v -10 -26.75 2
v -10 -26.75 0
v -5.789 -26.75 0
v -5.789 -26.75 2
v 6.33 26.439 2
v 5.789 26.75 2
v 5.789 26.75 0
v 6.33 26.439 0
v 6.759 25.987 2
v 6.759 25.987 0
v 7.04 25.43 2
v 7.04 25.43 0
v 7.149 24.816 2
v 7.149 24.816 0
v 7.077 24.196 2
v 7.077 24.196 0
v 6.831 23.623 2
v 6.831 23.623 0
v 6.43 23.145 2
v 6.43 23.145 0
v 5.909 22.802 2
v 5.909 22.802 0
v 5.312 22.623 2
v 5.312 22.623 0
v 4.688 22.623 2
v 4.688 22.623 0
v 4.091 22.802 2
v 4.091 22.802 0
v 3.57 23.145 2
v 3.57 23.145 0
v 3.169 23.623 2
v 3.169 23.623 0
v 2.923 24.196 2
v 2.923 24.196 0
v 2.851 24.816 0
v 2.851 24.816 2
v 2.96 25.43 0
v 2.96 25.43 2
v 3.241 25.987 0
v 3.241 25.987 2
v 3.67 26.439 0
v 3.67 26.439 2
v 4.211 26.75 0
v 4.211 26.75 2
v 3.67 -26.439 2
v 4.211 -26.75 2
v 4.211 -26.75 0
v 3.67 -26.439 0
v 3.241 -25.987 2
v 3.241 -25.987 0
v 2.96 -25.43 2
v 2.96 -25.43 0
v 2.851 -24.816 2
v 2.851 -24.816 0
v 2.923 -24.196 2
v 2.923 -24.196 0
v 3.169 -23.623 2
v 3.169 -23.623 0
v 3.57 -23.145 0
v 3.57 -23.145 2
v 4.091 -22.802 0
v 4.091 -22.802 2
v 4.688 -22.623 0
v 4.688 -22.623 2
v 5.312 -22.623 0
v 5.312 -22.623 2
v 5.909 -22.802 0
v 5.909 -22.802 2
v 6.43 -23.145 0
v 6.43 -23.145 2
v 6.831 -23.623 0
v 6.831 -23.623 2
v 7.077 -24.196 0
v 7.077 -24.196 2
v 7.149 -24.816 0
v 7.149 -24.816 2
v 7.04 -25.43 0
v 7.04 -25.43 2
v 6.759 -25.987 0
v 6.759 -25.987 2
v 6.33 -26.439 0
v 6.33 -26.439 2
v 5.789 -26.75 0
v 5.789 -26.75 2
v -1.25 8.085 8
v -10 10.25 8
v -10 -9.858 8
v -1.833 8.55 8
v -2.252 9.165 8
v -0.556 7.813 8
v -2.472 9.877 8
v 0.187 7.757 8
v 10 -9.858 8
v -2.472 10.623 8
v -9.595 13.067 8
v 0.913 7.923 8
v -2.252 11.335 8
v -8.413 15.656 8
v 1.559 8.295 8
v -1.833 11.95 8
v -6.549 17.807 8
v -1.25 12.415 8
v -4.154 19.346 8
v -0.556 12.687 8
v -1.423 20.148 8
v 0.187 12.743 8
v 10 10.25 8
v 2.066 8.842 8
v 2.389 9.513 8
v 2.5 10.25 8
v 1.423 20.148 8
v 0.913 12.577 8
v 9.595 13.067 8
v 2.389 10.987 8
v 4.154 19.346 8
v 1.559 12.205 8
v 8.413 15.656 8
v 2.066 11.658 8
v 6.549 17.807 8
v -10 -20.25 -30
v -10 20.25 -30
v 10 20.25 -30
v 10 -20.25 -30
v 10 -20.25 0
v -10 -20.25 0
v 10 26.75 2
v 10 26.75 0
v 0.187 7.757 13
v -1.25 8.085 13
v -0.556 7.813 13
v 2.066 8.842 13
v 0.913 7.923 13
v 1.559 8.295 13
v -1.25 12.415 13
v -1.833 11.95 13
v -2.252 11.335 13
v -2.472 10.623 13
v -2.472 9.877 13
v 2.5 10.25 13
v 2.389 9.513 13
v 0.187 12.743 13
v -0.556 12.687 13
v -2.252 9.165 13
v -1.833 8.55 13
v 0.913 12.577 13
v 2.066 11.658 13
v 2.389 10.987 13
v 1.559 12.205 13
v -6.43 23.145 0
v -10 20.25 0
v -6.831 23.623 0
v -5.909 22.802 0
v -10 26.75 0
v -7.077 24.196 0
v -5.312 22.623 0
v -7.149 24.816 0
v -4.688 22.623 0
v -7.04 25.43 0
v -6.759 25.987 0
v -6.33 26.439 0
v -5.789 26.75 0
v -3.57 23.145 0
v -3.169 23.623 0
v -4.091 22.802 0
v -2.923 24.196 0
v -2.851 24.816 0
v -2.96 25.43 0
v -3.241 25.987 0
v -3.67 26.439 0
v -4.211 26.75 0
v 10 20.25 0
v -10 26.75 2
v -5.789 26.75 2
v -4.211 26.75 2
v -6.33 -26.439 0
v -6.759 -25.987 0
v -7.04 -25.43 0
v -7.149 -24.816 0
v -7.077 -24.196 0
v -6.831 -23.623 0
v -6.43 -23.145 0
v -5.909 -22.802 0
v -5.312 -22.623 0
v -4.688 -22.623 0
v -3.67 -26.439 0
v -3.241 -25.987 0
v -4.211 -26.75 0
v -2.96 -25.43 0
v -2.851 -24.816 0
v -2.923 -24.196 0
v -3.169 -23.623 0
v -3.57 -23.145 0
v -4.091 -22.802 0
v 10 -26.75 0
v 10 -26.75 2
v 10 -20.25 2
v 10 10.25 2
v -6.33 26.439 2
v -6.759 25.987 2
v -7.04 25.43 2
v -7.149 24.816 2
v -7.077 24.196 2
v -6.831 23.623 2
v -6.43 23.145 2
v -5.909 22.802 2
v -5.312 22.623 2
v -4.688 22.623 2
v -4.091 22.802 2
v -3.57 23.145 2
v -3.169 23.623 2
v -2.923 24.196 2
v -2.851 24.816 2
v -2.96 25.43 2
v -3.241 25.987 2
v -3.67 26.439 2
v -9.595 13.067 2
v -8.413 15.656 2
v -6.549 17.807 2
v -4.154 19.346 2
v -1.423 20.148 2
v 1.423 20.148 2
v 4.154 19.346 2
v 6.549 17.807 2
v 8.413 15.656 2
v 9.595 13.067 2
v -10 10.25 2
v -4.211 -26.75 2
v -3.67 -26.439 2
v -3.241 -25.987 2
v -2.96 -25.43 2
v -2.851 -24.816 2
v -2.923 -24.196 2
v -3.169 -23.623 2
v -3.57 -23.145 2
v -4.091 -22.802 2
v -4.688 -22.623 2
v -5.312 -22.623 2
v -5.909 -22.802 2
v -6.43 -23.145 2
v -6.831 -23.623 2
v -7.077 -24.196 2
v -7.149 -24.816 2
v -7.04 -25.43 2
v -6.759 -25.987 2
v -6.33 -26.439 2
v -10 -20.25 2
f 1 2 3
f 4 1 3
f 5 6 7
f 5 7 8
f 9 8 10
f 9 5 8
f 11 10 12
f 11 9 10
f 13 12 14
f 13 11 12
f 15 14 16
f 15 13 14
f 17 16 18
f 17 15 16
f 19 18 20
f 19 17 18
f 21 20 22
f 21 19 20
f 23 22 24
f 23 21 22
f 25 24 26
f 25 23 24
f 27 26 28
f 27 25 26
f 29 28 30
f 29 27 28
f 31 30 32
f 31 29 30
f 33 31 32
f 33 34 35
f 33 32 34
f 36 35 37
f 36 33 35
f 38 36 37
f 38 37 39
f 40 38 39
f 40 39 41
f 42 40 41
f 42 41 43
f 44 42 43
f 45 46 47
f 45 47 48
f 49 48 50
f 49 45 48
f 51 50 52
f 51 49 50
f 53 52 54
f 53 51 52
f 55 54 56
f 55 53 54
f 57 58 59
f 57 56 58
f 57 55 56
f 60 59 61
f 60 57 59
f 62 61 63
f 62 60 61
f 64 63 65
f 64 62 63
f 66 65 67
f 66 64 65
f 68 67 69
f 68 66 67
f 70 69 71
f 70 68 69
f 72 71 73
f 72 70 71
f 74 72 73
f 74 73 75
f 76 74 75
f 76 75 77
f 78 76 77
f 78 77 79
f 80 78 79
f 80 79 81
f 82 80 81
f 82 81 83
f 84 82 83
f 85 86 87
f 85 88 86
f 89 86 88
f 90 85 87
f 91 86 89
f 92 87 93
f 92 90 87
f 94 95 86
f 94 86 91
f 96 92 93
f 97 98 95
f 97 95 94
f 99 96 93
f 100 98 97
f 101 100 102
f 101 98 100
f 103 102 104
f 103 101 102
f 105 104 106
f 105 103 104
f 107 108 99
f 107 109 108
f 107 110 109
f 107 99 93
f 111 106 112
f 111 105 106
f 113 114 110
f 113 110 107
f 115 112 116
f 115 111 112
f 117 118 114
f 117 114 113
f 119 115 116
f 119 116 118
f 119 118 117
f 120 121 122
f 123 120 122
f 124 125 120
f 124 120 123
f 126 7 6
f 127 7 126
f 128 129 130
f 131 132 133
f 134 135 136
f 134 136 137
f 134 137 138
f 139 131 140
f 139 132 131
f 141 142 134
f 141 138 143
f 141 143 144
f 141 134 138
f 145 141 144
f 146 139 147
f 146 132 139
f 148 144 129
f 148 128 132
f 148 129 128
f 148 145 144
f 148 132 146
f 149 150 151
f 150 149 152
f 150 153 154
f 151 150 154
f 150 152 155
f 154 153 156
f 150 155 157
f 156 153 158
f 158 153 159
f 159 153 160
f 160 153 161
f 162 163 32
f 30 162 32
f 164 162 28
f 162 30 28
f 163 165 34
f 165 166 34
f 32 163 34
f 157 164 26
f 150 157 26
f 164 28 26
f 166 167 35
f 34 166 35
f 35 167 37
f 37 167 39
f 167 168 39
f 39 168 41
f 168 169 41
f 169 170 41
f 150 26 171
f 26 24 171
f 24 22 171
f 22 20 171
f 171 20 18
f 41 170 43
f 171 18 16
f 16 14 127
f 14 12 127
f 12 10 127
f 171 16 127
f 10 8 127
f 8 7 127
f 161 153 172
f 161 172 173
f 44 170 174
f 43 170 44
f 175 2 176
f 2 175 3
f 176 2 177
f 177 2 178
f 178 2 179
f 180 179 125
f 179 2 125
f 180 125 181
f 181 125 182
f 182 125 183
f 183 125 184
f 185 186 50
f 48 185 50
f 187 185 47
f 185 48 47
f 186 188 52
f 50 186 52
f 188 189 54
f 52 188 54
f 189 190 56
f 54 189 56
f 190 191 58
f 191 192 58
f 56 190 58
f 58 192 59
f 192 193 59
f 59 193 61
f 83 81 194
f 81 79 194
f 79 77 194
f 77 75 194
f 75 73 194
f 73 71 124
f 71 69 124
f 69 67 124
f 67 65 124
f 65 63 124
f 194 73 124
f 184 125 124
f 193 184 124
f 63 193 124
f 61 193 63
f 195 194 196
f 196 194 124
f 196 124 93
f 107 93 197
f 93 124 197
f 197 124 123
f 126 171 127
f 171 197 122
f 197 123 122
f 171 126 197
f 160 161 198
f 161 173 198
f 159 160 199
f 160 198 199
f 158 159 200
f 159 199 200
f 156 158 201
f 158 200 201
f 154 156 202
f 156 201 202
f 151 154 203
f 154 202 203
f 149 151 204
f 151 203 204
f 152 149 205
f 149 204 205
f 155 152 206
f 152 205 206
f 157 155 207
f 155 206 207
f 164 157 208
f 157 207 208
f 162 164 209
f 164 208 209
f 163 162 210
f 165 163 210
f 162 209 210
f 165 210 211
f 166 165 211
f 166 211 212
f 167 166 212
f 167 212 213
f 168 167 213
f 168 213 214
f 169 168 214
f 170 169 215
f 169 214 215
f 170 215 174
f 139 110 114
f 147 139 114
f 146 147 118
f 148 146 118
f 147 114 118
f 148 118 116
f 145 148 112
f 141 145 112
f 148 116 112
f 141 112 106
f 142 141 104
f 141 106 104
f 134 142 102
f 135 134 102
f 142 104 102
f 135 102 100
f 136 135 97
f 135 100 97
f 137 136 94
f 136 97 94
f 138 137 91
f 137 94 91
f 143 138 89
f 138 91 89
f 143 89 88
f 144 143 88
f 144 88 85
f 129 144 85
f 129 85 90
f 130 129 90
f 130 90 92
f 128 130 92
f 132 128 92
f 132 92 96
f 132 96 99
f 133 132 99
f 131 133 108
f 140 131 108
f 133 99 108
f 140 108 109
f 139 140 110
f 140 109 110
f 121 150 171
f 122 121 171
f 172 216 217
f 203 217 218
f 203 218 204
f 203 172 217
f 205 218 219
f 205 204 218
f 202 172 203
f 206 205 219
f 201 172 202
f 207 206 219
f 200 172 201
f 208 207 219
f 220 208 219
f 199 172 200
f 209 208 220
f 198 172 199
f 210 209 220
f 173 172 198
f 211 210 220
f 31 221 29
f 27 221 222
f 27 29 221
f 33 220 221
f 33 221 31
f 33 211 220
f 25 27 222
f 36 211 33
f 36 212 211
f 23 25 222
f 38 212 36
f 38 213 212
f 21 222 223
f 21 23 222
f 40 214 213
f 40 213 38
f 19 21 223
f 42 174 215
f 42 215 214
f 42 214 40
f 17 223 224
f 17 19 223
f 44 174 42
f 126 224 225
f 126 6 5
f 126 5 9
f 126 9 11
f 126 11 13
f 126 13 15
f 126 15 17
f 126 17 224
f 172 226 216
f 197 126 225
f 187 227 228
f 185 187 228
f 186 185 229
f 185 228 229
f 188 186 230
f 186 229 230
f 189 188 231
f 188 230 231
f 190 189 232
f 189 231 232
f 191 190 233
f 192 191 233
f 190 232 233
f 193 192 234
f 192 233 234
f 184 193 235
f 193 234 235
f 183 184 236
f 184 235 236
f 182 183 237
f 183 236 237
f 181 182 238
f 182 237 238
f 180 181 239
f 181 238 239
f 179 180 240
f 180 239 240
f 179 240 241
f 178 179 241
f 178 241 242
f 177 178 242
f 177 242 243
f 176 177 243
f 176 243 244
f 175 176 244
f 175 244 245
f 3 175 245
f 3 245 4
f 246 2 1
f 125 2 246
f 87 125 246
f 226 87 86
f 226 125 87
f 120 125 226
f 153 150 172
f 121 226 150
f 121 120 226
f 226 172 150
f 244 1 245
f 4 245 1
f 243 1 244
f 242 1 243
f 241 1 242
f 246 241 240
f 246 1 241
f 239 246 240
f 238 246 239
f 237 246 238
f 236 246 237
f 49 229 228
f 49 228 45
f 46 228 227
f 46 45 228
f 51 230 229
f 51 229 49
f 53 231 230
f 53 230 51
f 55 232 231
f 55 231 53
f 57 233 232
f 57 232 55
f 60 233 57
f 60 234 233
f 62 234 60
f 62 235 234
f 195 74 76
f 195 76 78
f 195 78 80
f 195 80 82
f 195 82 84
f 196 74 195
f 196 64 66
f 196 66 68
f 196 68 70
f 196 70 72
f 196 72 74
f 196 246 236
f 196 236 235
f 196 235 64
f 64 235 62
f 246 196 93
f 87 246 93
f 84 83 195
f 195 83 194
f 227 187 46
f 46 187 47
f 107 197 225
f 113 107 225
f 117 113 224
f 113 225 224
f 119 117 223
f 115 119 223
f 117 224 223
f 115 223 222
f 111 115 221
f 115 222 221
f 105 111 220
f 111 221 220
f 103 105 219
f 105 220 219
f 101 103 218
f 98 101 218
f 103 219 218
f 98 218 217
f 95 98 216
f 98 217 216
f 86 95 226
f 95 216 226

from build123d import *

# Parameters (mm, degrees)
SKETCH_W        = 20
SKETCH_H        = 40.5
PAD_DEPTH       = 30
SKETCH001_W     = 20
SKETCH001_H     = 53.5
PAD001_DEPTH    = 2
SKETCH002_R     = 2.15
POCKET_DEPTH    = 162.939917
PAD002_DEPTH    = 6
SKETCH004_R     = 2.5
PAD003_DEPTH    = 5
POCKET001_DEPTH = 20.001


with BuildPart() as part:
    # Sketch → Pad (new body)
    with BuildSketch(Plane.XY):
        Rectangle(SKETCH_W, SKETCH_H)
    extrude(amount=-PAD_DEPTH)

    # Sketch001 (on Face5 of Pad) → Pad001 (join)
    with BuildSketch(Plane.XY):
        Rectangle(SKETCH001_W, SKETCH001_H)
    extrude(amount=PAD001_DEPTH)

    # Sketch002 (on Face5 of Pad001) → Pocket (cut, through all)
    with BuildSketch(Plane.XY.offset(2)):
        with Locations((-5, -24.75)):
            Circle(SKETCH002_R)
        with Locations((-5, 24.75)):
            Circle(SKETCH002_R)
    pocket = extrude(amount=-POCKET_DEPTH, mode=Mode.SUBTRACT)

    # Mirrored: Pocket across Sketch002 V_Axis
    add(pocket.mirror(Plane(origin=(0, 0, 2), x_dir=(0, 0, 1), z_dir=(1, 0, 0))), mode=Mode.SUBTRACT)

    # Sketch003 (on Face4 of Mirrored) → Pad002 (join)
    with BuildSketch(Plane.XY.offset(2)):
        with BuildLine():
            ThreePointArc((10, 10.25), (0, 20.25), (-10, 10.25))
            Line((-10, -20.25), (-10, 10.25))
            Line((10, -20.25), (-10, -20.25))
            Line((10, 10.25), (10, -20.25))
        make_face()
    extrude(amount=PAD002_DEPTH)

    # Sketch004 (on Face23 of Pad002) → Pad003 (join)
    with BuildSketch(Plane.XY.offset(8)):
        with Locations((0, 10.25)):
            Circle(SKETCH004_R)
    extrude(amount=PAD003_DEPTH)

    # Sketch005 (on Face22 of Pad003) → Pocket001 (cut, through all)
    with BuildSketch(Plane.YZ.offset(10)):
        Polygon((-20.25, 2), (-9.857695, 8), (-20.25, 8), align=None)
    extrude(amount=-POCKET001_DEPTH, mode=Mode.SUBTRACT)


solid = part.part
